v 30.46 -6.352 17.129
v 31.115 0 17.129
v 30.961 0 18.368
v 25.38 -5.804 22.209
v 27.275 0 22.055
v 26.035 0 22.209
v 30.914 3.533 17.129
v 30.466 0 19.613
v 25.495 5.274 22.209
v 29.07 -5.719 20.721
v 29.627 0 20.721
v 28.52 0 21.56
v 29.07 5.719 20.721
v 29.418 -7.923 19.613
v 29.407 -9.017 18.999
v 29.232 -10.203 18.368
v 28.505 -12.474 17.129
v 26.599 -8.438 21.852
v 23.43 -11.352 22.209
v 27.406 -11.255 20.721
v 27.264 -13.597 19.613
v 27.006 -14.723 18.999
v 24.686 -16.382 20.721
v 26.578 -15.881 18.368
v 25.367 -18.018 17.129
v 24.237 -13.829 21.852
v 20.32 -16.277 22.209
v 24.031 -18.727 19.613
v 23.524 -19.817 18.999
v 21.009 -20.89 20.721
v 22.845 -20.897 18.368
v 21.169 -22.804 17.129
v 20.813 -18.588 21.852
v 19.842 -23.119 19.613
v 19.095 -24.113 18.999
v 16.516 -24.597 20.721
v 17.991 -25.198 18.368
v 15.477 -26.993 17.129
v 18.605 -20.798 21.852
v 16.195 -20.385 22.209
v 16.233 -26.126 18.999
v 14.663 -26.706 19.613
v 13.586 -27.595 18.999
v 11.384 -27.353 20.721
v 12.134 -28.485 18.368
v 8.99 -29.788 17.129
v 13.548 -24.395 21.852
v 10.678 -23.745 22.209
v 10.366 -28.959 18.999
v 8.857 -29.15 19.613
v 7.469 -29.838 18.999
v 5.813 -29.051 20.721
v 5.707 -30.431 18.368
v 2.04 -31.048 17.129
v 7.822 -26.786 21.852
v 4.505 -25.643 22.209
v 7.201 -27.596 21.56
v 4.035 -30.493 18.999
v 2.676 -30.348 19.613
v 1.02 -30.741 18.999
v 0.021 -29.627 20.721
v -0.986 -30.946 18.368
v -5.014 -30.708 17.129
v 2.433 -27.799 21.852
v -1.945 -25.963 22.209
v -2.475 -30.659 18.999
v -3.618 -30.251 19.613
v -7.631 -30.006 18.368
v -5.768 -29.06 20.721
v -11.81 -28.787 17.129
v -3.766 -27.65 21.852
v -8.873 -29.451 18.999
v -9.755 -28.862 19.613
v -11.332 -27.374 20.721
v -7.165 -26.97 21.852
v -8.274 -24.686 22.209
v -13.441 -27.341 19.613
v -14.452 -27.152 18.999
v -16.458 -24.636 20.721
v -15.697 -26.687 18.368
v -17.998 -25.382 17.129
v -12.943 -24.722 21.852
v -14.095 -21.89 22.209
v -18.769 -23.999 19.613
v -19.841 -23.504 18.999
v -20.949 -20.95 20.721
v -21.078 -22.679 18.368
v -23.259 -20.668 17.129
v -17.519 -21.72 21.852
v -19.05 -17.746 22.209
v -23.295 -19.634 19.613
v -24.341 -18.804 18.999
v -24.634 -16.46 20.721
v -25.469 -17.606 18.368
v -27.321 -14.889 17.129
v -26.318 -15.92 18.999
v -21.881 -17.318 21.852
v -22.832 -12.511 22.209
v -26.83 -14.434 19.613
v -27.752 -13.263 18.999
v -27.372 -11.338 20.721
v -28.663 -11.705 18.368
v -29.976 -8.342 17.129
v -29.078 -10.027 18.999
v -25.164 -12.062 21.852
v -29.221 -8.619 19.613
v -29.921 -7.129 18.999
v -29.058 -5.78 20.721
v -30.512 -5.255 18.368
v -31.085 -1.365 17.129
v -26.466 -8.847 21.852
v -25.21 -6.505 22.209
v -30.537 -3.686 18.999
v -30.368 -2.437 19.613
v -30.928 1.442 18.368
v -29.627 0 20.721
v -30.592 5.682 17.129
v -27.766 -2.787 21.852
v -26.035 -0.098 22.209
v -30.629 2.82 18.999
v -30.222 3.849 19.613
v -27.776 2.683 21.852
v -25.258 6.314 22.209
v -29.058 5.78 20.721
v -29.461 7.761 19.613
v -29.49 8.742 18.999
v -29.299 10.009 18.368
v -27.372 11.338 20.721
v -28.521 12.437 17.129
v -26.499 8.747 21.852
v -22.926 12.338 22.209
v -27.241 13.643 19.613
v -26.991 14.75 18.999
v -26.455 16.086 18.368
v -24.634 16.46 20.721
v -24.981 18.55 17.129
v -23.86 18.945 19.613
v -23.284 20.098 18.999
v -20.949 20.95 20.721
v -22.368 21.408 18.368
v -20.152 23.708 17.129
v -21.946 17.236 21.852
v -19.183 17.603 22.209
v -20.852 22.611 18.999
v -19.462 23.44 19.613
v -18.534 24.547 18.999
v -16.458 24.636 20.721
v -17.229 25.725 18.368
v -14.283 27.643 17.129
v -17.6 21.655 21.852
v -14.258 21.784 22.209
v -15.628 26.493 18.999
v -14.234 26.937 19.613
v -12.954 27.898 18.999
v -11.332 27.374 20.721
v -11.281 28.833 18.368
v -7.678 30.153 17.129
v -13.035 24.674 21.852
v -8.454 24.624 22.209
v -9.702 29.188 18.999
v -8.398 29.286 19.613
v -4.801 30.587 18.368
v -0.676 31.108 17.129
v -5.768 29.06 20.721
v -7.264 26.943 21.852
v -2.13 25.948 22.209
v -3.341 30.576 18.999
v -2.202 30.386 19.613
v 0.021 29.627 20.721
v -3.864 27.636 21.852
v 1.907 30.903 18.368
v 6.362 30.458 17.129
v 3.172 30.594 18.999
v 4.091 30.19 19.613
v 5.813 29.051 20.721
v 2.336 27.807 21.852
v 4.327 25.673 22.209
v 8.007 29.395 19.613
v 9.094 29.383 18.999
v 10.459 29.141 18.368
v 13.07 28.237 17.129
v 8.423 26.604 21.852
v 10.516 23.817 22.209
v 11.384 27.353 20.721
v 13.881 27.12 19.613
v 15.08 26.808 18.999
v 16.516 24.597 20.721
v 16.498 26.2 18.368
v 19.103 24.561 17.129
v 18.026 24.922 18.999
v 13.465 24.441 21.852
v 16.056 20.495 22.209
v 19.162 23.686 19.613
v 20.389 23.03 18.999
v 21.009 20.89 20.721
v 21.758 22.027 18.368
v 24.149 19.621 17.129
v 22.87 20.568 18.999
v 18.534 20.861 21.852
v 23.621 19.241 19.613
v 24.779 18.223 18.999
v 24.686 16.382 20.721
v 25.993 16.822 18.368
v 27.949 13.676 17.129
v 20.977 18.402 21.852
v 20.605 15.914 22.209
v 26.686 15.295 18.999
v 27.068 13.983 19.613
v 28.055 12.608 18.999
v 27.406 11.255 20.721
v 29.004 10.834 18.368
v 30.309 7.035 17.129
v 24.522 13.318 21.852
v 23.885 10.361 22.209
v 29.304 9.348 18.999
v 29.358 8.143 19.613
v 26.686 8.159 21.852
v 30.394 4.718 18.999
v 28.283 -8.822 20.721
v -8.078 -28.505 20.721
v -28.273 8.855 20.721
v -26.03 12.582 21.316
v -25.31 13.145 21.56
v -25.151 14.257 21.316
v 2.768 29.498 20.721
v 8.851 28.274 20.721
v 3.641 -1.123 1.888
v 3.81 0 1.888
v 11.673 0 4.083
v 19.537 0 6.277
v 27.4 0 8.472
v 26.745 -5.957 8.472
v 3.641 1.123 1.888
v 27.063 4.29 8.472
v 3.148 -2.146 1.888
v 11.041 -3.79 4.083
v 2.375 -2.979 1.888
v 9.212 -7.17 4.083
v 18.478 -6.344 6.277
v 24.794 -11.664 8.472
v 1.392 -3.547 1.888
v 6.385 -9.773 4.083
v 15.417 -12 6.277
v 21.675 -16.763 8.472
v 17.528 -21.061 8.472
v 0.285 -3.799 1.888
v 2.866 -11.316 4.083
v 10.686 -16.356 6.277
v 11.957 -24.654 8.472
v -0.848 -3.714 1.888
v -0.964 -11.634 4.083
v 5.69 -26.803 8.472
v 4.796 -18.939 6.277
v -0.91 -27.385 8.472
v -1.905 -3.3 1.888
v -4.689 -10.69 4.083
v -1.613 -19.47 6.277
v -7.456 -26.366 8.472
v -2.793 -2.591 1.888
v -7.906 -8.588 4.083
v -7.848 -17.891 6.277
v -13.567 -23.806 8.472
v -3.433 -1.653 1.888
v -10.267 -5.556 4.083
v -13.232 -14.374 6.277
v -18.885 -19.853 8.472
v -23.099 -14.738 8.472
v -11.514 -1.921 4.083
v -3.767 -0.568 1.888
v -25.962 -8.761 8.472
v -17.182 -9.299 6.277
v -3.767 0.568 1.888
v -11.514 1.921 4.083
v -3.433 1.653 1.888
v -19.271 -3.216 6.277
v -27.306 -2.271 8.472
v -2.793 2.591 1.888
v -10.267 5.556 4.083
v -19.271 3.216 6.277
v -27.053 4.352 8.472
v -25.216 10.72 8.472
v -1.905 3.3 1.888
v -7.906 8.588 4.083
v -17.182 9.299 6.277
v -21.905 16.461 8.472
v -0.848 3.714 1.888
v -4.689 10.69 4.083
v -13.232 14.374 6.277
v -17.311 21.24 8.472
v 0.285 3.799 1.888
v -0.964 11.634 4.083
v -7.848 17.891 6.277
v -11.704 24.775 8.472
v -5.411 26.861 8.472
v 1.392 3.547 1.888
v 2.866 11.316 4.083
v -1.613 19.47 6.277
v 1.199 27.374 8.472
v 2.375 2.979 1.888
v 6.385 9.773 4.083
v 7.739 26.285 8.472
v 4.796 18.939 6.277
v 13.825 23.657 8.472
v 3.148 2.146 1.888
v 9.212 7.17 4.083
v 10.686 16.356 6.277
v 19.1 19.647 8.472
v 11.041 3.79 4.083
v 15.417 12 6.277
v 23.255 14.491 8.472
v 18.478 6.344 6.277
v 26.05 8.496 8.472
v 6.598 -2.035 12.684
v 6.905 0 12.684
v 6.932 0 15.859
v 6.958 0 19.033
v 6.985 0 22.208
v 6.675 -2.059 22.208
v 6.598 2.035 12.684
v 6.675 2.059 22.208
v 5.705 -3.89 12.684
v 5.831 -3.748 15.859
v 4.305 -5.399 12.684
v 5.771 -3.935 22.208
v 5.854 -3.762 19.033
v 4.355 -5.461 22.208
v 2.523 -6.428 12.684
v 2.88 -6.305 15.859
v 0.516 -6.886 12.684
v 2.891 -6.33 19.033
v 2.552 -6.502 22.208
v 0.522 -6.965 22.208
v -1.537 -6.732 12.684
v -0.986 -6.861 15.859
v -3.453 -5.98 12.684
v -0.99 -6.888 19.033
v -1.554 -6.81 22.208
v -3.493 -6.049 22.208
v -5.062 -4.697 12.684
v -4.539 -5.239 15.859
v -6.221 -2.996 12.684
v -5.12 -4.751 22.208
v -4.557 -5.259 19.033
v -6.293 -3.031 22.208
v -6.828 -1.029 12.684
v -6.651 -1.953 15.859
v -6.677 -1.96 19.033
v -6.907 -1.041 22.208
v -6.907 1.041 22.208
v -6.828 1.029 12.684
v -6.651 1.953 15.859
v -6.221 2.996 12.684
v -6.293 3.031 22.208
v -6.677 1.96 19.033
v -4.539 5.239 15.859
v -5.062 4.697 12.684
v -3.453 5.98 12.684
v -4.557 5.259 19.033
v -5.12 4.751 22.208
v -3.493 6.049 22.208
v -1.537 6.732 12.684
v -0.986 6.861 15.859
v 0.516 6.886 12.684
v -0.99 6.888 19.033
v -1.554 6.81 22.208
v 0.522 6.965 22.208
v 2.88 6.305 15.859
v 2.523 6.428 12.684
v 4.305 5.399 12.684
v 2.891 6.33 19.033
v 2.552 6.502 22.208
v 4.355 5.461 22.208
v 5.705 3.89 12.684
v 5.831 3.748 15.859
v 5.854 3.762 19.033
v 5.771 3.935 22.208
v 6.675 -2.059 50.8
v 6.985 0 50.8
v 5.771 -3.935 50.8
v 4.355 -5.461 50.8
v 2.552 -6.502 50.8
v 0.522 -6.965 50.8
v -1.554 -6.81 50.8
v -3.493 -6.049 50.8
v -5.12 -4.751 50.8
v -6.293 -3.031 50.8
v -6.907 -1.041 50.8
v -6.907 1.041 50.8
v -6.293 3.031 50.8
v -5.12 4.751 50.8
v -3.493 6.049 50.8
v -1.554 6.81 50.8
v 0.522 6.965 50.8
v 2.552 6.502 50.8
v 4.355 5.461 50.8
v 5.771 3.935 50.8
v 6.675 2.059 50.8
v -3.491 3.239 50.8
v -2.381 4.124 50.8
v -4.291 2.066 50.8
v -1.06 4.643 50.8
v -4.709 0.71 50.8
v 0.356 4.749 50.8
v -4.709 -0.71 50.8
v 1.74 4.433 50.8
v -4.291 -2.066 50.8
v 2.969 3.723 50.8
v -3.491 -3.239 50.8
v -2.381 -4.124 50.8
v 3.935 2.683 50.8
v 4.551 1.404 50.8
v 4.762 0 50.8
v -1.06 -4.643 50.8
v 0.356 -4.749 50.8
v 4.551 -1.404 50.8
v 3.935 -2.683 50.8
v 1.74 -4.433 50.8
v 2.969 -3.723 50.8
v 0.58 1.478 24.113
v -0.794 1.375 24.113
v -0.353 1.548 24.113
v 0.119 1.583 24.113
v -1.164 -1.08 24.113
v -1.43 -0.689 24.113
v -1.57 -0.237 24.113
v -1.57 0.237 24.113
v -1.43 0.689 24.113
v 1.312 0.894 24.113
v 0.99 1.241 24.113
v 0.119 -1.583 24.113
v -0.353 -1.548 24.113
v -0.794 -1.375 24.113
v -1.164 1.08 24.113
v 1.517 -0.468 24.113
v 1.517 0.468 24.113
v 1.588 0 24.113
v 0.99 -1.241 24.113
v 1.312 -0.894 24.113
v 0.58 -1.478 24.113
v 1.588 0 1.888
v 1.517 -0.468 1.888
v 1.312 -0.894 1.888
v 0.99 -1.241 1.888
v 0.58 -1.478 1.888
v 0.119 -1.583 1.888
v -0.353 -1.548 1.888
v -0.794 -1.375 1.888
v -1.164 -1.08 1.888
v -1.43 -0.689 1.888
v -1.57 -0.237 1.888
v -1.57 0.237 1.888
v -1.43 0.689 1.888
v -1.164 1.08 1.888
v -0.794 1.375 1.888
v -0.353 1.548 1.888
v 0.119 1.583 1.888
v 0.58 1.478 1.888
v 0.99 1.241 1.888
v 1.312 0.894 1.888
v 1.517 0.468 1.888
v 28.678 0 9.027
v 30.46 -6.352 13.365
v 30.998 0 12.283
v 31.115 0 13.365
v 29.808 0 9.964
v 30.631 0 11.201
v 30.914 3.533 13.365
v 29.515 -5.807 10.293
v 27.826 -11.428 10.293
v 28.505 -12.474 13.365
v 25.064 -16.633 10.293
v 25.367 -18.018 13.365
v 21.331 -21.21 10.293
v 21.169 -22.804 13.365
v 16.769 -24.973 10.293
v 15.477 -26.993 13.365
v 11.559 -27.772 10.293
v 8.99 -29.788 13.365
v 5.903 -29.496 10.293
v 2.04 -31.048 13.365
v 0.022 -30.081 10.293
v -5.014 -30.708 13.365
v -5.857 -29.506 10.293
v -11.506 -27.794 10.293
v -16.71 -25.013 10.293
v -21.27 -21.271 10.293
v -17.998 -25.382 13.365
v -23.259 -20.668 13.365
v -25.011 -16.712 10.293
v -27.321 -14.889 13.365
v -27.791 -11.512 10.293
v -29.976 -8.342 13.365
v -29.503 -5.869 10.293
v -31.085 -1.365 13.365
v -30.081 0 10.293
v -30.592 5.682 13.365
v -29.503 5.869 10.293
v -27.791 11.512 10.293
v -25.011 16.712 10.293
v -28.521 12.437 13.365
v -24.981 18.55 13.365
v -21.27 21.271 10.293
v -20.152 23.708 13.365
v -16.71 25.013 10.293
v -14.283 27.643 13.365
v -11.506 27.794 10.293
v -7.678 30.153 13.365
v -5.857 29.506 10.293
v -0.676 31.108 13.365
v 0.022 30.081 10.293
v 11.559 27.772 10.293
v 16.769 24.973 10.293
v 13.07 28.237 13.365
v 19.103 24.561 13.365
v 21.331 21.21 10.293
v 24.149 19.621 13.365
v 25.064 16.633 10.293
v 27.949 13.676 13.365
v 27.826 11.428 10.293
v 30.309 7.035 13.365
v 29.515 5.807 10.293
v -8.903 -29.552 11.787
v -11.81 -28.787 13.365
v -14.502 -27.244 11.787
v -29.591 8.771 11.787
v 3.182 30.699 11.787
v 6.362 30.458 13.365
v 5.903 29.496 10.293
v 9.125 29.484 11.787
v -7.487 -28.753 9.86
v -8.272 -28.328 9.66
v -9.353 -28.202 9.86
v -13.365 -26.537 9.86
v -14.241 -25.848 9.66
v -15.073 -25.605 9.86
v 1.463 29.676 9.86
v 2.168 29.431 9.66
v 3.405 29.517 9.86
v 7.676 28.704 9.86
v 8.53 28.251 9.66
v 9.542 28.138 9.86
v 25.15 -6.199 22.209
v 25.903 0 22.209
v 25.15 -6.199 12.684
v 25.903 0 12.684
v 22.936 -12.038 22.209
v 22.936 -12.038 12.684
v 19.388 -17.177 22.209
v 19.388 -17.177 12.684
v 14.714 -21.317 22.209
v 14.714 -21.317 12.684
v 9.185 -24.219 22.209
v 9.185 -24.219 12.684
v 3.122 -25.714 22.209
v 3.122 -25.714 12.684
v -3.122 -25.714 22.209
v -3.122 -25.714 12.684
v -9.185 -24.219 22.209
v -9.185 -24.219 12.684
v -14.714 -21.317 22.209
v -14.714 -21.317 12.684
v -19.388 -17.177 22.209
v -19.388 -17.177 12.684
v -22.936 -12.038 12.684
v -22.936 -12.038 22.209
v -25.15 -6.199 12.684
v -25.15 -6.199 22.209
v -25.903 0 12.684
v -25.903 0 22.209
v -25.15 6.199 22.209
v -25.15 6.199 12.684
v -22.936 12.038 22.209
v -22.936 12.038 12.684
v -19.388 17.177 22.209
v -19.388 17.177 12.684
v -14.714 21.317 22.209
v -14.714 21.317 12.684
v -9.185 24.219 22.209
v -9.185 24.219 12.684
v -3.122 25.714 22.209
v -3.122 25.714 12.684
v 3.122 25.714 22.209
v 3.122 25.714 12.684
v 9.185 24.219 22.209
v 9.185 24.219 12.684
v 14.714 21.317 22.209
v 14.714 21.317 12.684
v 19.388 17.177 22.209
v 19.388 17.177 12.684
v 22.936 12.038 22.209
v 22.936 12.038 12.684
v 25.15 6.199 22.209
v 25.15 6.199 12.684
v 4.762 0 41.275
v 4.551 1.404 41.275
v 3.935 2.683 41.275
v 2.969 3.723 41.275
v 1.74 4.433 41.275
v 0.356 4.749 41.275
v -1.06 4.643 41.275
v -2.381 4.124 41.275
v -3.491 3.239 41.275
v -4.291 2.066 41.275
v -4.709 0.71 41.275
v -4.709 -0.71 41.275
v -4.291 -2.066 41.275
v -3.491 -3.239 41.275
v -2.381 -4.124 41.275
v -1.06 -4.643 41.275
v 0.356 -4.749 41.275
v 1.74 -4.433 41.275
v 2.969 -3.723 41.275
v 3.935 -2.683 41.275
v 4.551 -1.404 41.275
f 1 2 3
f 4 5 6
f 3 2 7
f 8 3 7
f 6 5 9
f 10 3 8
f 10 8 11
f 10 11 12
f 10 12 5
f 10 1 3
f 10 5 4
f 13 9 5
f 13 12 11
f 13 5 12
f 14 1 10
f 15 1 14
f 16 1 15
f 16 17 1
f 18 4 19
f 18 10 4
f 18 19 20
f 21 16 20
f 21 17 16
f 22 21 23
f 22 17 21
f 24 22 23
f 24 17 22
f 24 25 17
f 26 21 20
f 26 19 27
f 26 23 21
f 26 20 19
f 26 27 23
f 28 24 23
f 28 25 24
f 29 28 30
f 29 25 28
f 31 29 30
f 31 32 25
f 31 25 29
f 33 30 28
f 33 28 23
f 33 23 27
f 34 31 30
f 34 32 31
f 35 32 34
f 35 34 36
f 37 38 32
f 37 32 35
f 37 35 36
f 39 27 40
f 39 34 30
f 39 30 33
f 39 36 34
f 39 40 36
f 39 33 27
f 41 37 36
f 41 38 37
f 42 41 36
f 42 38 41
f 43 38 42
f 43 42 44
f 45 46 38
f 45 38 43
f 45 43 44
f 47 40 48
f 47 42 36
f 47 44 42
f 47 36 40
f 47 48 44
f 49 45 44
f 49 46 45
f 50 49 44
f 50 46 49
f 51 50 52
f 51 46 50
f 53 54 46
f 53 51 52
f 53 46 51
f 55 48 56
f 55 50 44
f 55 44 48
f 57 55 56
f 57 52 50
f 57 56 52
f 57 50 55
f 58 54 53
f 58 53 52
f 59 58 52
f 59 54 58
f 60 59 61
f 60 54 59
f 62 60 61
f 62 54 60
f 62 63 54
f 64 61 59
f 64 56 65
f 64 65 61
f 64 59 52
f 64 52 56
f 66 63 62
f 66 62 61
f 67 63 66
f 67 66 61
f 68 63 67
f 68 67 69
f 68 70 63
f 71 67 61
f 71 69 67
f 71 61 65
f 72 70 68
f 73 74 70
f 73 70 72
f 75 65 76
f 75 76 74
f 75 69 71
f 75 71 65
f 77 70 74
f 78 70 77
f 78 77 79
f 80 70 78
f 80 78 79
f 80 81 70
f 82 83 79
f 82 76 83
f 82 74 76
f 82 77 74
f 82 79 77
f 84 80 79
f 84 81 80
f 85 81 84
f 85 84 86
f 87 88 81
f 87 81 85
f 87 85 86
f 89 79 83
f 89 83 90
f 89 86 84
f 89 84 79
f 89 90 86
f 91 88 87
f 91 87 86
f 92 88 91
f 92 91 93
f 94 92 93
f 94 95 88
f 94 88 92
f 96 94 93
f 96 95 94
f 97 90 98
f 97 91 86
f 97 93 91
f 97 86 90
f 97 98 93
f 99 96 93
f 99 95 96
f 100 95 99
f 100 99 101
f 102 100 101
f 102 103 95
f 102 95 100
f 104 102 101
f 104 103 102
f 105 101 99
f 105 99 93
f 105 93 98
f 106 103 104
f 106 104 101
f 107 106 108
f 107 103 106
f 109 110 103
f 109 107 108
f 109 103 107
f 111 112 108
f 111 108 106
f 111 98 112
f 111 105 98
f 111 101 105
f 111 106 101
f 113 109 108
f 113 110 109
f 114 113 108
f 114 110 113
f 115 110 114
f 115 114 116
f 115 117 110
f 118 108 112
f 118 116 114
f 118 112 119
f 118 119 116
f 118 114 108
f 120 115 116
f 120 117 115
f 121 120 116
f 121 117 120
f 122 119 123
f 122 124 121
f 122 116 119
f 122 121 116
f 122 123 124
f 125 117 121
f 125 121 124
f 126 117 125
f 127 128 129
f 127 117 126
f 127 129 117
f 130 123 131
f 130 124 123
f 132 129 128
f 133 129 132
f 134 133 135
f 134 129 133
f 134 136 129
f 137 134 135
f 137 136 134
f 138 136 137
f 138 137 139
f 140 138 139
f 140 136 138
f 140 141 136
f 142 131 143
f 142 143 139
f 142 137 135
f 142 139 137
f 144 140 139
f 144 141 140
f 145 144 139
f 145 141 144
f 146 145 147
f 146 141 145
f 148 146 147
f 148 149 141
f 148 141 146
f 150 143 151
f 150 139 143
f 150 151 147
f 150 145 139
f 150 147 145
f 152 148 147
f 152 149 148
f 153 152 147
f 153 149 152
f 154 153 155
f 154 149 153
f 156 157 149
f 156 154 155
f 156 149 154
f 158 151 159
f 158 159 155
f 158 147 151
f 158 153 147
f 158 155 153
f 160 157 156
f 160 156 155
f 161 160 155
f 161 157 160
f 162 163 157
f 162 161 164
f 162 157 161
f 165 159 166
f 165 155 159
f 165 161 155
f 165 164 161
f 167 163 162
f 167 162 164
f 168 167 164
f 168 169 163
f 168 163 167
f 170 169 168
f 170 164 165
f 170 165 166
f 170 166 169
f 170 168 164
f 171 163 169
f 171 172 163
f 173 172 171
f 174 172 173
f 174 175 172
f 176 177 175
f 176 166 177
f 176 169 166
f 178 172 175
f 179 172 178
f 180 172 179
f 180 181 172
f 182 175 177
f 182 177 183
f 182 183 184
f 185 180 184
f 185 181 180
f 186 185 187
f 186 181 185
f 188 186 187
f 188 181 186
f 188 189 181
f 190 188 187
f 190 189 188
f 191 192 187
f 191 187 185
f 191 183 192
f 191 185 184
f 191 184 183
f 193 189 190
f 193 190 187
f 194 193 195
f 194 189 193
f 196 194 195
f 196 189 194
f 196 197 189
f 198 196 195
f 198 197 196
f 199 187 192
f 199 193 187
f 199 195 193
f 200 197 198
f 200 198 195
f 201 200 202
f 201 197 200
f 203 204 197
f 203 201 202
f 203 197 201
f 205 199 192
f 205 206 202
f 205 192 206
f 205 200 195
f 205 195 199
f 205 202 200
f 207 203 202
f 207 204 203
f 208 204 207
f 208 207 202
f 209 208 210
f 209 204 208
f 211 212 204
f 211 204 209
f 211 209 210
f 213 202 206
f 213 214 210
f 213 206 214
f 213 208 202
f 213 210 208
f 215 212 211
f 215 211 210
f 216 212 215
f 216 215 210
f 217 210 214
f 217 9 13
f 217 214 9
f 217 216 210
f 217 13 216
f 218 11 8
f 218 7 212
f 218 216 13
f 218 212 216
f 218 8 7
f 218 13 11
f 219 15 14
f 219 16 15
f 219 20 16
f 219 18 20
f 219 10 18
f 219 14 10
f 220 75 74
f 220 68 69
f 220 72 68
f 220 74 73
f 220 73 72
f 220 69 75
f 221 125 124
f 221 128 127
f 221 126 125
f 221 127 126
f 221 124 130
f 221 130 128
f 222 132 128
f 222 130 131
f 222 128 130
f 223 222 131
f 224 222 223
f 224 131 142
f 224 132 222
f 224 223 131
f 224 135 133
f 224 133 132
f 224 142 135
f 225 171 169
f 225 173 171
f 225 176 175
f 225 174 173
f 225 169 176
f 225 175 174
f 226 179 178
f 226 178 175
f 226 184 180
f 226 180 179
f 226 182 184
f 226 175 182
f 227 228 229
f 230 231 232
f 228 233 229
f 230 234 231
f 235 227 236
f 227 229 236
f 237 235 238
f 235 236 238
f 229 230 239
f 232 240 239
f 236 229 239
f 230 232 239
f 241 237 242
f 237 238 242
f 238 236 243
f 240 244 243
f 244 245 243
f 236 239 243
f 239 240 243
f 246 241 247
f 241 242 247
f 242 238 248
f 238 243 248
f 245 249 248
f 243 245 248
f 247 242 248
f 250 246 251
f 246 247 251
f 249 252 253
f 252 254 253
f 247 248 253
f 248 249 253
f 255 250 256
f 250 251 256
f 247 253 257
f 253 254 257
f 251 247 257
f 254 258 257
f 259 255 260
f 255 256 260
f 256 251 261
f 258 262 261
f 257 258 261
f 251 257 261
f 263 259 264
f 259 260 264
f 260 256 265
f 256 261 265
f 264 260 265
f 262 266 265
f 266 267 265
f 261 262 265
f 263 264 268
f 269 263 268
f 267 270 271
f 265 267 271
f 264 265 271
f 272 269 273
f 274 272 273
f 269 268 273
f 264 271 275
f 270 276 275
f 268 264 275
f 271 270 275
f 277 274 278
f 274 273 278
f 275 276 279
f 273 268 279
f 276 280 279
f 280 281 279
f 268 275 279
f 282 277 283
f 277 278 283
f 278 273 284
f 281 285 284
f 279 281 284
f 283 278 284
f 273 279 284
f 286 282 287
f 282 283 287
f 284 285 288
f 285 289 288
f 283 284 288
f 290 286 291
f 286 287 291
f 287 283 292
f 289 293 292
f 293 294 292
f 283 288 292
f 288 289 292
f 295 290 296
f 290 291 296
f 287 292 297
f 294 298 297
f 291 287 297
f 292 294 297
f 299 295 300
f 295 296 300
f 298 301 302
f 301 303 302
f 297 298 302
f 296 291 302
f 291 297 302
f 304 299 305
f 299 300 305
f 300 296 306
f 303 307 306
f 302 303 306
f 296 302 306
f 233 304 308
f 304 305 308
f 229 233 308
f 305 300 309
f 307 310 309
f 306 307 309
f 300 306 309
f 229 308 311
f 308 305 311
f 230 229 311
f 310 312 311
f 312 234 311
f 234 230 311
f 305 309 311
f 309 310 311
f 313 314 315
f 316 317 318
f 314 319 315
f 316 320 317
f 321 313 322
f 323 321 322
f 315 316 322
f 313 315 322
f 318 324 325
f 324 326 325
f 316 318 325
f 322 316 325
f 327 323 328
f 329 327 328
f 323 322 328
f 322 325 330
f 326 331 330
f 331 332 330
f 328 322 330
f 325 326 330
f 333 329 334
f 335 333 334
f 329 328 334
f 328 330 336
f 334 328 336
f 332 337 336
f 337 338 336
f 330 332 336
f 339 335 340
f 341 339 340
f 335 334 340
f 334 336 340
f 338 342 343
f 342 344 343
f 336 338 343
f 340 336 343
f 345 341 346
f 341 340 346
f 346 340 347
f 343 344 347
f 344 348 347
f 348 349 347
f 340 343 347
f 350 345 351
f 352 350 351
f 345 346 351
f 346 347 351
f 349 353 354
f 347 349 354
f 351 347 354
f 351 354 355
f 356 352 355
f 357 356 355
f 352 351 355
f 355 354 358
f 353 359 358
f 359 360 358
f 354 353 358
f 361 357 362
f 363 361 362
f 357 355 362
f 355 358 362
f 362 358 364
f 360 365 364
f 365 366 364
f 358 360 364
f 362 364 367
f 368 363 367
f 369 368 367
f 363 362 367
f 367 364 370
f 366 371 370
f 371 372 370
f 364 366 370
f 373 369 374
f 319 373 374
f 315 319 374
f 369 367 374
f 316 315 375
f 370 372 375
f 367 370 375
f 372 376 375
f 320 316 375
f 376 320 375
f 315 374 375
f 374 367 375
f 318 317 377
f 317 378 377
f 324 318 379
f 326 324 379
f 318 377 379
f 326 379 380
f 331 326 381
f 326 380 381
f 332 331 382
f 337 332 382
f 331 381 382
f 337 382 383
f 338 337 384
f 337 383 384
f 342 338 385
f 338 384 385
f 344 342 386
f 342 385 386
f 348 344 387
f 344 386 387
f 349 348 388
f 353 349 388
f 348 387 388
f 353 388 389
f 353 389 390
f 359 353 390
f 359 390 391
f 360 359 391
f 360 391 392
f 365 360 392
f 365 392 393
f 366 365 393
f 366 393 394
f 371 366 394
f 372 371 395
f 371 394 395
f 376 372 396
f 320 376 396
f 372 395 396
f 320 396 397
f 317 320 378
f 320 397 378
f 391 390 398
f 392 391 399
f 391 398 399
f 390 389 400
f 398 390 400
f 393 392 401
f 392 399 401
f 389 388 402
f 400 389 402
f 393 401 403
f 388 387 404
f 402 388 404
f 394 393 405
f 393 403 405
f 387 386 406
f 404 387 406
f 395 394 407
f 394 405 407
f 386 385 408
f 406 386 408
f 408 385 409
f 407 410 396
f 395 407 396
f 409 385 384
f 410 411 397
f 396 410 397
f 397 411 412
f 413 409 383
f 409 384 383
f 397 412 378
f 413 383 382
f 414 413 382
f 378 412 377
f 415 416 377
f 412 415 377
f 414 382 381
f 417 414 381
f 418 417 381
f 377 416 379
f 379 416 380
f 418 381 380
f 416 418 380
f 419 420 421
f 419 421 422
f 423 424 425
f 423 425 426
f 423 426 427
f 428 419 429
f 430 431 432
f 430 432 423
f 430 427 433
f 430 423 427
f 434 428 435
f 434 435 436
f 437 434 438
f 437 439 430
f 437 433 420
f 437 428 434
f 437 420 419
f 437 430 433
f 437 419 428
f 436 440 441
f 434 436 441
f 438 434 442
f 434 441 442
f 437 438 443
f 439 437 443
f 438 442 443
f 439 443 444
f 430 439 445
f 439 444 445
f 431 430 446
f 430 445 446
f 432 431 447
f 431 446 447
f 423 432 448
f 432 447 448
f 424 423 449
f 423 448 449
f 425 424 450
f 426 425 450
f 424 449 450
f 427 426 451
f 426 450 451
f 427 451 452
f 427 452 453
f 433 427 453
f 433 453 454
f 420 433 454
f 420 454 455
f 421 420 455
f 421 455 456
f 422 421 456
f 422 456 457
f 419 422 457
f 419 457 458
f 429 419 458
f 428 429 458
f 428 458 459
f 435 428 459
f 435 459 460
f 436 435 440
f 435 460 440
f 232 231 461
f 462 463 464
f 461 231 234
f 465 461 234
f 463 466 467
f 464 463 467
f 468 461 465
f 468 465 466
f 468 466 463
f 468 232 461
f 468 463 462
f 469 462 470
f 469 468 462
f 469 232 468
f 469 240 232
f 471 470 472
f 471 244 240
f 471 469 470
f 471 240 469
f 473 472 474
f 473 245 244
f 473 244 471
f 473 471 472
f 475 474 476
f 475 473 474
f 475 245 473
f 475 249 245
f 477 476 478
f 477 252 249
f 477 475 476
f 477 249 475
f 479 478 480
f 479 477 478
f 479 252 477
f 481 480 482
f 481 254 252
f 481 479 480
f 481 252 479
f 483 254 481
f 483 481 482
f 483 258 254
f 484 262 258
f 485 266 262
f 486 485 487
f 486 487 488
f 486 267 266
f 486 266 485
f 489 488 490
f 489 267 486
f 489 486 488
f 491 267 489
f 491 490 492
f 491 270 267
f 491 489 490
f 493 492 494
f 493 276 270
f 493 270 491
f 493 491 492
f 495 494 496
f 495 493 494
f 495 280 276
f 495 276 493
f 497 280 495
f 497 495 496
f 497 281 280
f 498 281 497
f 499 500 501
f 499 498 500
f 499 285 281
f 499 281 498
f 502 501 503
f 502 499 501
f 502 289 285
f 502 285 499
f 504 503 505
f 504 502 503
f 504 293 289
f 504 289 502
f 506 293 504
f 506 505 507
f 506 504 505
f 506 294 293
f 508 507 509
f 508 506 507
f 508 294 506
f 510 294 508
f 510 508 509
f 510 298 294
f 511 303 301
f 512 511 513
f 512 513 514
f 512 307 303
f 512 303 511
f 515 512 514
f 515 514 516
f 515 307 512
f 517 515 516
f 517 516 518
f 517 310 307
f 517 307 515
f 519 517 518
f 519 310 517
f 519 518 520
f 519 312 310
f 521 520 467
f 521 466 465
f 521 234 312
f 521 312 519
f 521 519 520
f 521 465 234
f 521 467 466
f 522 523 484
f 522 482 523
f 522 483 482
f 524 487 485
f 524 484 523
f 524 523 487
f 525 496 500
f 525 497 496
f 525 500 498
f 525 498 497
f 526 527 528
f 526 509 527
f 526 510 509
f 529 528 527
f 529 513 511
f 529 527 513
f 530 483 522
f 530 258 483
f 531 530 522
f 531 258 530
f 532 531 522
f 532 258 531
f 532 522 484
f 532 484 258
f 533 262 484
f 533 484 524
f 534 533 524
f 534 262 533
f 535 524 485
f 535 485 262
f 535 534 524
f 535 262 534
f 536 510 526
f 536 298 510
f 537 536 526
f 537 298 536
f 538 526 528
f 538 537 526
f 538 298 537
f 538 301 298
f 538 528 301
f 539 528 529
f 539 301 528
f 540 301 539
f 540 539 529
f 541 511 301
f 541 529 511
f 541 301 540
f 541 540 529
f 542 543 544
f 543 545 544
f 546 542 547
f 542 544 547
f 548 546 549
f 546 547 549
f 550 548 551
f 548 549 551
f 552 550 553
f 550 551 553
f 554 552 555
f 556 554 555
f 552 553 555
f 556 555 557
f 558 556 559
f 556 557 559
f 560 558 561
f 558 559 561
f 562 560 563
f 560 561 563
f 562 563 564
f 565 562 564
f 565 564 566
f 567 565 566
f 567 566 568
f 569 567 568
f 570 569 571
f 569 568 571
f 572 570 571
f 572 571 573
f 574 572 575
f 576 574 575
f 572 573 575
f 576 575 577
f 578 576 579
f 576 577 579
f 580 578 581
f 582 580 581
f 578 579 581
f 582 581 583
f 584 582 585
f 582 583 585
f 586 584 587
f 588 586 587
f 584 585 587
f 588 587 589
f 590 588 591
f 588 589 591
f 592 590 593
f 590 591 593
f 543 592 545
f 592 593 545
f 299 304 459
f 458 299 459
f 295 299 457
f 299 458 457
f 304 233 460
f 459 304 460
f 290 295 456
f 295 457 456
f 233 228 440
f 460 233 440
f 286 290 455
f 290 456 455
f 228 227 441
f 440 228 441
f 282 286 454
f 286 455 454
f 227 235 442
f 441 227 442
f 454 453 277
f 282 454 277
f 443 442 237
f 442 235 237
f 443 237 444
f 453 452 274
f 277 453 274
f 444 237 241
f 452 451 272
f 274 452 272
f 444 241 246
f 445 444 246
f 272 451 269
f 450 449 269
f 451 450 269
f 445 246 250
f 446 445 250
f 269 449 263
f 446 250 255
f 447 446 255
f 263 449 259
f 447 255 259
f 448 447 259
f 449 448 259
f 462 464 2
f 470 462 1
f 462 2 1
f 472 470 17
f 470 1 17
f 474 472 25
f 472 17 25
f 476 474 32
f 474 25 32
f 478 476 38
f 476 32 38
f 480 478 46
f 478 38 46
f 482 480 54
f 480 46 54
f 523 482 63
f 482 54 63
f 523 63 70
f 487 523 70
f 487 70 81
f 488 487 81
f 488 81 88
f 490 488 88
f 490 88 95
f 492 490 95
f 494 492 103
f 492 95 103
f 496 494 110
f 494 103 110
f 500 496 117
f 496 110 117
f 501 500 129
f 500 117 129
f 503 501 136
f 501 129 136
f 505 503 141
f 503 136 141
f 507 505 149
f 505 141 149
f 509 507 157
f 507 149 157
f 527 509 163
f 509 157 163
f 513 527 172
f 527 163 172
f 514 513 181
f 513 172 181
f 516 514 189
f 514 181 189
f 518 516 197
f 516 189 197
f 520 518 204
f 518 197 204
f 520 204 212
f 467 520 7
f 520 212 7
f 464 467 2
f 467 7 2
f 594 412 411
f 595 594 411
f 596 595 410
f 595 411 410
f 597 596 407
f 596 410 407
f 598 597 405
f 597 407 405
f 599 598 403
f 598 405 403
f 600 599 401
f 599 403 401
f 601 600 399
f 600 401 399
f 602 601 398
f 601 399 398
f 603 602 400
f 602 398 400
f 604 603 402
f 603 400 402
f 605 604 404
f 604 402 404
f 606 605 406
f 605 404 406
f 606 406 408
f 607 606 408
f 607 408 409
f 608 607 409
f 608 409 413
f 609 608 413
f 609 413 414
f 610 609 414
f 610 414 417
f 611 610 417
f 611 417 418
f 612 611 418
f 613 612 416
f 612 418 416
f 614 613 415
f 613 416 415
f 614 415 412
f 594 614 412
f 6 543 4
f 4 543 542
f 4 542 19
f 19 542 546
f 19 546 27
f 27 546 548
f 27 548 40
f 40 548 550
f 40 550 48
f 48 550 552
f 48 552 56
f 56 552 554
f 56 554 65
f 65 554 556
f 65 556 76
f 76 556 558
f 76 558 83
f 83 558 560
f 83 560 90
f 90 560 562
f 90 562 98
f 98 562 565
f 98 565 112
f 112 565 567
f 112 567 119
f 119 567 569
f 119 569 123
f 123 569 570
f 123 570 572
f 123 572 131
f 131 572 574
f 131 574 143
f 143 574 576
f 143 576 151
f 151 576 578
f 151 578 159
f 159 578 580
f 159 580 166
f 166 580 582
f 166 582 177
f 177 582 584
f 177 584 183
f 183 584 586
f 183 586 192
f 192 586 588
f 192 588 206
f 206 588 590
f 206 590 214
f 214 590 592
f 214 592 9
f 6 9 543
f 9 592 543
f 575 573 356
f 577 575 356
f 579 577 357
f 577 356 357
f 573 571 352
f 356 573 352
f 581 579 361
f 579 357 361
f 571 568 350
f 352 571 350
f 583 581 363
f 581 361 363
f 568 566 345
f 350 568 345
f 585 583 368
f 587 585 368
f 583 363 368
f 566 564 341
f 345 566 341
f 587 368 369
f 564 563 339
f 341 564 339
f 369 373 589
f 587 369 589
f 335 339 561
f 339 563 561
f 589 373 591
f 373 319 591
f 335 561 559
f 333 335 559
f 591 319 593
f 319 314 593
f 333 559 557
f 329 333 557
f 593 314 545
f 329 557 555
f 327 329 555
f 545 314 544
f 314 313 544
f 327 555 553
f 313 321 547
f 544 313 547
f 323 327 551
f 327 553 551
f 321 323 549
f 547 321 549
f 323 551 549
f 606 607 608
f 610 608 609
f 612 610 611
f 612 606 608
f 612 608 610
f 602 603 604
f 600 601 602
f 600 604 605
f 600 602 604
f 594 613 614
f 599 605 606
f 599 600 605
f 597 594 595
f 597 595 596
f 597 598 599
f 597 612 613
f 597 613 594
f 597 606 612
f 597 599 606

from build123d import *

# Parameters (mm, degrees)
F2_R     = 4.7625
F3_DEPTH = 9.525
F4_R     = 1.5875
F5_DEPTH = 22.225
F6_R     = 5.08


with BuildPart() as f1:
    # F0 (on Front) → F1 (revolve)
    with BuildSketch(Plane.XZ):
        Polygon((3.81, 1.888357), (31.115, 9.508357), (31.115, 22.208357), (25.902521, 22.208692), (25.902521, 12.683692), (6.905095, 12.683692), (6.985, 22.208357), (6.985, 50.8), (0, 50.8), (0, 1.888357), align=None)
    revolve(axis=Axis((0, 0, 26.344178), (0, 0, -1)))

    # F2 (on face) → F3 (cut)
    with BuildSketch(Plane.XY.offset(50.8)):
        Circle(F2_R)
    extrude(amount=-F3_DEPTH, mode=Mode.SUBTRACT)

    # F4 (on face) → F5 (cut)
    with BuildSketch(Plane(origin=(0, 0, 1.888357), x_dir=(1, 0, 0), z_dir=(0, 0, -1))):
        Circle(F4_R)
    extrude(amount=-F5_DEPTH, mode=Mode.SUBTRACT)

    # F6
    f6_edges = [f1.edges().sort_by_distance(p)[0] for p in [
        (-31.115, 0, 9.508357),
        (-31.115, 0, 22.208357),
        (31.115, 0, 15.858357),
    ]]
    fillet(f6_edges, radius=F6_R)


solid = f1.part
